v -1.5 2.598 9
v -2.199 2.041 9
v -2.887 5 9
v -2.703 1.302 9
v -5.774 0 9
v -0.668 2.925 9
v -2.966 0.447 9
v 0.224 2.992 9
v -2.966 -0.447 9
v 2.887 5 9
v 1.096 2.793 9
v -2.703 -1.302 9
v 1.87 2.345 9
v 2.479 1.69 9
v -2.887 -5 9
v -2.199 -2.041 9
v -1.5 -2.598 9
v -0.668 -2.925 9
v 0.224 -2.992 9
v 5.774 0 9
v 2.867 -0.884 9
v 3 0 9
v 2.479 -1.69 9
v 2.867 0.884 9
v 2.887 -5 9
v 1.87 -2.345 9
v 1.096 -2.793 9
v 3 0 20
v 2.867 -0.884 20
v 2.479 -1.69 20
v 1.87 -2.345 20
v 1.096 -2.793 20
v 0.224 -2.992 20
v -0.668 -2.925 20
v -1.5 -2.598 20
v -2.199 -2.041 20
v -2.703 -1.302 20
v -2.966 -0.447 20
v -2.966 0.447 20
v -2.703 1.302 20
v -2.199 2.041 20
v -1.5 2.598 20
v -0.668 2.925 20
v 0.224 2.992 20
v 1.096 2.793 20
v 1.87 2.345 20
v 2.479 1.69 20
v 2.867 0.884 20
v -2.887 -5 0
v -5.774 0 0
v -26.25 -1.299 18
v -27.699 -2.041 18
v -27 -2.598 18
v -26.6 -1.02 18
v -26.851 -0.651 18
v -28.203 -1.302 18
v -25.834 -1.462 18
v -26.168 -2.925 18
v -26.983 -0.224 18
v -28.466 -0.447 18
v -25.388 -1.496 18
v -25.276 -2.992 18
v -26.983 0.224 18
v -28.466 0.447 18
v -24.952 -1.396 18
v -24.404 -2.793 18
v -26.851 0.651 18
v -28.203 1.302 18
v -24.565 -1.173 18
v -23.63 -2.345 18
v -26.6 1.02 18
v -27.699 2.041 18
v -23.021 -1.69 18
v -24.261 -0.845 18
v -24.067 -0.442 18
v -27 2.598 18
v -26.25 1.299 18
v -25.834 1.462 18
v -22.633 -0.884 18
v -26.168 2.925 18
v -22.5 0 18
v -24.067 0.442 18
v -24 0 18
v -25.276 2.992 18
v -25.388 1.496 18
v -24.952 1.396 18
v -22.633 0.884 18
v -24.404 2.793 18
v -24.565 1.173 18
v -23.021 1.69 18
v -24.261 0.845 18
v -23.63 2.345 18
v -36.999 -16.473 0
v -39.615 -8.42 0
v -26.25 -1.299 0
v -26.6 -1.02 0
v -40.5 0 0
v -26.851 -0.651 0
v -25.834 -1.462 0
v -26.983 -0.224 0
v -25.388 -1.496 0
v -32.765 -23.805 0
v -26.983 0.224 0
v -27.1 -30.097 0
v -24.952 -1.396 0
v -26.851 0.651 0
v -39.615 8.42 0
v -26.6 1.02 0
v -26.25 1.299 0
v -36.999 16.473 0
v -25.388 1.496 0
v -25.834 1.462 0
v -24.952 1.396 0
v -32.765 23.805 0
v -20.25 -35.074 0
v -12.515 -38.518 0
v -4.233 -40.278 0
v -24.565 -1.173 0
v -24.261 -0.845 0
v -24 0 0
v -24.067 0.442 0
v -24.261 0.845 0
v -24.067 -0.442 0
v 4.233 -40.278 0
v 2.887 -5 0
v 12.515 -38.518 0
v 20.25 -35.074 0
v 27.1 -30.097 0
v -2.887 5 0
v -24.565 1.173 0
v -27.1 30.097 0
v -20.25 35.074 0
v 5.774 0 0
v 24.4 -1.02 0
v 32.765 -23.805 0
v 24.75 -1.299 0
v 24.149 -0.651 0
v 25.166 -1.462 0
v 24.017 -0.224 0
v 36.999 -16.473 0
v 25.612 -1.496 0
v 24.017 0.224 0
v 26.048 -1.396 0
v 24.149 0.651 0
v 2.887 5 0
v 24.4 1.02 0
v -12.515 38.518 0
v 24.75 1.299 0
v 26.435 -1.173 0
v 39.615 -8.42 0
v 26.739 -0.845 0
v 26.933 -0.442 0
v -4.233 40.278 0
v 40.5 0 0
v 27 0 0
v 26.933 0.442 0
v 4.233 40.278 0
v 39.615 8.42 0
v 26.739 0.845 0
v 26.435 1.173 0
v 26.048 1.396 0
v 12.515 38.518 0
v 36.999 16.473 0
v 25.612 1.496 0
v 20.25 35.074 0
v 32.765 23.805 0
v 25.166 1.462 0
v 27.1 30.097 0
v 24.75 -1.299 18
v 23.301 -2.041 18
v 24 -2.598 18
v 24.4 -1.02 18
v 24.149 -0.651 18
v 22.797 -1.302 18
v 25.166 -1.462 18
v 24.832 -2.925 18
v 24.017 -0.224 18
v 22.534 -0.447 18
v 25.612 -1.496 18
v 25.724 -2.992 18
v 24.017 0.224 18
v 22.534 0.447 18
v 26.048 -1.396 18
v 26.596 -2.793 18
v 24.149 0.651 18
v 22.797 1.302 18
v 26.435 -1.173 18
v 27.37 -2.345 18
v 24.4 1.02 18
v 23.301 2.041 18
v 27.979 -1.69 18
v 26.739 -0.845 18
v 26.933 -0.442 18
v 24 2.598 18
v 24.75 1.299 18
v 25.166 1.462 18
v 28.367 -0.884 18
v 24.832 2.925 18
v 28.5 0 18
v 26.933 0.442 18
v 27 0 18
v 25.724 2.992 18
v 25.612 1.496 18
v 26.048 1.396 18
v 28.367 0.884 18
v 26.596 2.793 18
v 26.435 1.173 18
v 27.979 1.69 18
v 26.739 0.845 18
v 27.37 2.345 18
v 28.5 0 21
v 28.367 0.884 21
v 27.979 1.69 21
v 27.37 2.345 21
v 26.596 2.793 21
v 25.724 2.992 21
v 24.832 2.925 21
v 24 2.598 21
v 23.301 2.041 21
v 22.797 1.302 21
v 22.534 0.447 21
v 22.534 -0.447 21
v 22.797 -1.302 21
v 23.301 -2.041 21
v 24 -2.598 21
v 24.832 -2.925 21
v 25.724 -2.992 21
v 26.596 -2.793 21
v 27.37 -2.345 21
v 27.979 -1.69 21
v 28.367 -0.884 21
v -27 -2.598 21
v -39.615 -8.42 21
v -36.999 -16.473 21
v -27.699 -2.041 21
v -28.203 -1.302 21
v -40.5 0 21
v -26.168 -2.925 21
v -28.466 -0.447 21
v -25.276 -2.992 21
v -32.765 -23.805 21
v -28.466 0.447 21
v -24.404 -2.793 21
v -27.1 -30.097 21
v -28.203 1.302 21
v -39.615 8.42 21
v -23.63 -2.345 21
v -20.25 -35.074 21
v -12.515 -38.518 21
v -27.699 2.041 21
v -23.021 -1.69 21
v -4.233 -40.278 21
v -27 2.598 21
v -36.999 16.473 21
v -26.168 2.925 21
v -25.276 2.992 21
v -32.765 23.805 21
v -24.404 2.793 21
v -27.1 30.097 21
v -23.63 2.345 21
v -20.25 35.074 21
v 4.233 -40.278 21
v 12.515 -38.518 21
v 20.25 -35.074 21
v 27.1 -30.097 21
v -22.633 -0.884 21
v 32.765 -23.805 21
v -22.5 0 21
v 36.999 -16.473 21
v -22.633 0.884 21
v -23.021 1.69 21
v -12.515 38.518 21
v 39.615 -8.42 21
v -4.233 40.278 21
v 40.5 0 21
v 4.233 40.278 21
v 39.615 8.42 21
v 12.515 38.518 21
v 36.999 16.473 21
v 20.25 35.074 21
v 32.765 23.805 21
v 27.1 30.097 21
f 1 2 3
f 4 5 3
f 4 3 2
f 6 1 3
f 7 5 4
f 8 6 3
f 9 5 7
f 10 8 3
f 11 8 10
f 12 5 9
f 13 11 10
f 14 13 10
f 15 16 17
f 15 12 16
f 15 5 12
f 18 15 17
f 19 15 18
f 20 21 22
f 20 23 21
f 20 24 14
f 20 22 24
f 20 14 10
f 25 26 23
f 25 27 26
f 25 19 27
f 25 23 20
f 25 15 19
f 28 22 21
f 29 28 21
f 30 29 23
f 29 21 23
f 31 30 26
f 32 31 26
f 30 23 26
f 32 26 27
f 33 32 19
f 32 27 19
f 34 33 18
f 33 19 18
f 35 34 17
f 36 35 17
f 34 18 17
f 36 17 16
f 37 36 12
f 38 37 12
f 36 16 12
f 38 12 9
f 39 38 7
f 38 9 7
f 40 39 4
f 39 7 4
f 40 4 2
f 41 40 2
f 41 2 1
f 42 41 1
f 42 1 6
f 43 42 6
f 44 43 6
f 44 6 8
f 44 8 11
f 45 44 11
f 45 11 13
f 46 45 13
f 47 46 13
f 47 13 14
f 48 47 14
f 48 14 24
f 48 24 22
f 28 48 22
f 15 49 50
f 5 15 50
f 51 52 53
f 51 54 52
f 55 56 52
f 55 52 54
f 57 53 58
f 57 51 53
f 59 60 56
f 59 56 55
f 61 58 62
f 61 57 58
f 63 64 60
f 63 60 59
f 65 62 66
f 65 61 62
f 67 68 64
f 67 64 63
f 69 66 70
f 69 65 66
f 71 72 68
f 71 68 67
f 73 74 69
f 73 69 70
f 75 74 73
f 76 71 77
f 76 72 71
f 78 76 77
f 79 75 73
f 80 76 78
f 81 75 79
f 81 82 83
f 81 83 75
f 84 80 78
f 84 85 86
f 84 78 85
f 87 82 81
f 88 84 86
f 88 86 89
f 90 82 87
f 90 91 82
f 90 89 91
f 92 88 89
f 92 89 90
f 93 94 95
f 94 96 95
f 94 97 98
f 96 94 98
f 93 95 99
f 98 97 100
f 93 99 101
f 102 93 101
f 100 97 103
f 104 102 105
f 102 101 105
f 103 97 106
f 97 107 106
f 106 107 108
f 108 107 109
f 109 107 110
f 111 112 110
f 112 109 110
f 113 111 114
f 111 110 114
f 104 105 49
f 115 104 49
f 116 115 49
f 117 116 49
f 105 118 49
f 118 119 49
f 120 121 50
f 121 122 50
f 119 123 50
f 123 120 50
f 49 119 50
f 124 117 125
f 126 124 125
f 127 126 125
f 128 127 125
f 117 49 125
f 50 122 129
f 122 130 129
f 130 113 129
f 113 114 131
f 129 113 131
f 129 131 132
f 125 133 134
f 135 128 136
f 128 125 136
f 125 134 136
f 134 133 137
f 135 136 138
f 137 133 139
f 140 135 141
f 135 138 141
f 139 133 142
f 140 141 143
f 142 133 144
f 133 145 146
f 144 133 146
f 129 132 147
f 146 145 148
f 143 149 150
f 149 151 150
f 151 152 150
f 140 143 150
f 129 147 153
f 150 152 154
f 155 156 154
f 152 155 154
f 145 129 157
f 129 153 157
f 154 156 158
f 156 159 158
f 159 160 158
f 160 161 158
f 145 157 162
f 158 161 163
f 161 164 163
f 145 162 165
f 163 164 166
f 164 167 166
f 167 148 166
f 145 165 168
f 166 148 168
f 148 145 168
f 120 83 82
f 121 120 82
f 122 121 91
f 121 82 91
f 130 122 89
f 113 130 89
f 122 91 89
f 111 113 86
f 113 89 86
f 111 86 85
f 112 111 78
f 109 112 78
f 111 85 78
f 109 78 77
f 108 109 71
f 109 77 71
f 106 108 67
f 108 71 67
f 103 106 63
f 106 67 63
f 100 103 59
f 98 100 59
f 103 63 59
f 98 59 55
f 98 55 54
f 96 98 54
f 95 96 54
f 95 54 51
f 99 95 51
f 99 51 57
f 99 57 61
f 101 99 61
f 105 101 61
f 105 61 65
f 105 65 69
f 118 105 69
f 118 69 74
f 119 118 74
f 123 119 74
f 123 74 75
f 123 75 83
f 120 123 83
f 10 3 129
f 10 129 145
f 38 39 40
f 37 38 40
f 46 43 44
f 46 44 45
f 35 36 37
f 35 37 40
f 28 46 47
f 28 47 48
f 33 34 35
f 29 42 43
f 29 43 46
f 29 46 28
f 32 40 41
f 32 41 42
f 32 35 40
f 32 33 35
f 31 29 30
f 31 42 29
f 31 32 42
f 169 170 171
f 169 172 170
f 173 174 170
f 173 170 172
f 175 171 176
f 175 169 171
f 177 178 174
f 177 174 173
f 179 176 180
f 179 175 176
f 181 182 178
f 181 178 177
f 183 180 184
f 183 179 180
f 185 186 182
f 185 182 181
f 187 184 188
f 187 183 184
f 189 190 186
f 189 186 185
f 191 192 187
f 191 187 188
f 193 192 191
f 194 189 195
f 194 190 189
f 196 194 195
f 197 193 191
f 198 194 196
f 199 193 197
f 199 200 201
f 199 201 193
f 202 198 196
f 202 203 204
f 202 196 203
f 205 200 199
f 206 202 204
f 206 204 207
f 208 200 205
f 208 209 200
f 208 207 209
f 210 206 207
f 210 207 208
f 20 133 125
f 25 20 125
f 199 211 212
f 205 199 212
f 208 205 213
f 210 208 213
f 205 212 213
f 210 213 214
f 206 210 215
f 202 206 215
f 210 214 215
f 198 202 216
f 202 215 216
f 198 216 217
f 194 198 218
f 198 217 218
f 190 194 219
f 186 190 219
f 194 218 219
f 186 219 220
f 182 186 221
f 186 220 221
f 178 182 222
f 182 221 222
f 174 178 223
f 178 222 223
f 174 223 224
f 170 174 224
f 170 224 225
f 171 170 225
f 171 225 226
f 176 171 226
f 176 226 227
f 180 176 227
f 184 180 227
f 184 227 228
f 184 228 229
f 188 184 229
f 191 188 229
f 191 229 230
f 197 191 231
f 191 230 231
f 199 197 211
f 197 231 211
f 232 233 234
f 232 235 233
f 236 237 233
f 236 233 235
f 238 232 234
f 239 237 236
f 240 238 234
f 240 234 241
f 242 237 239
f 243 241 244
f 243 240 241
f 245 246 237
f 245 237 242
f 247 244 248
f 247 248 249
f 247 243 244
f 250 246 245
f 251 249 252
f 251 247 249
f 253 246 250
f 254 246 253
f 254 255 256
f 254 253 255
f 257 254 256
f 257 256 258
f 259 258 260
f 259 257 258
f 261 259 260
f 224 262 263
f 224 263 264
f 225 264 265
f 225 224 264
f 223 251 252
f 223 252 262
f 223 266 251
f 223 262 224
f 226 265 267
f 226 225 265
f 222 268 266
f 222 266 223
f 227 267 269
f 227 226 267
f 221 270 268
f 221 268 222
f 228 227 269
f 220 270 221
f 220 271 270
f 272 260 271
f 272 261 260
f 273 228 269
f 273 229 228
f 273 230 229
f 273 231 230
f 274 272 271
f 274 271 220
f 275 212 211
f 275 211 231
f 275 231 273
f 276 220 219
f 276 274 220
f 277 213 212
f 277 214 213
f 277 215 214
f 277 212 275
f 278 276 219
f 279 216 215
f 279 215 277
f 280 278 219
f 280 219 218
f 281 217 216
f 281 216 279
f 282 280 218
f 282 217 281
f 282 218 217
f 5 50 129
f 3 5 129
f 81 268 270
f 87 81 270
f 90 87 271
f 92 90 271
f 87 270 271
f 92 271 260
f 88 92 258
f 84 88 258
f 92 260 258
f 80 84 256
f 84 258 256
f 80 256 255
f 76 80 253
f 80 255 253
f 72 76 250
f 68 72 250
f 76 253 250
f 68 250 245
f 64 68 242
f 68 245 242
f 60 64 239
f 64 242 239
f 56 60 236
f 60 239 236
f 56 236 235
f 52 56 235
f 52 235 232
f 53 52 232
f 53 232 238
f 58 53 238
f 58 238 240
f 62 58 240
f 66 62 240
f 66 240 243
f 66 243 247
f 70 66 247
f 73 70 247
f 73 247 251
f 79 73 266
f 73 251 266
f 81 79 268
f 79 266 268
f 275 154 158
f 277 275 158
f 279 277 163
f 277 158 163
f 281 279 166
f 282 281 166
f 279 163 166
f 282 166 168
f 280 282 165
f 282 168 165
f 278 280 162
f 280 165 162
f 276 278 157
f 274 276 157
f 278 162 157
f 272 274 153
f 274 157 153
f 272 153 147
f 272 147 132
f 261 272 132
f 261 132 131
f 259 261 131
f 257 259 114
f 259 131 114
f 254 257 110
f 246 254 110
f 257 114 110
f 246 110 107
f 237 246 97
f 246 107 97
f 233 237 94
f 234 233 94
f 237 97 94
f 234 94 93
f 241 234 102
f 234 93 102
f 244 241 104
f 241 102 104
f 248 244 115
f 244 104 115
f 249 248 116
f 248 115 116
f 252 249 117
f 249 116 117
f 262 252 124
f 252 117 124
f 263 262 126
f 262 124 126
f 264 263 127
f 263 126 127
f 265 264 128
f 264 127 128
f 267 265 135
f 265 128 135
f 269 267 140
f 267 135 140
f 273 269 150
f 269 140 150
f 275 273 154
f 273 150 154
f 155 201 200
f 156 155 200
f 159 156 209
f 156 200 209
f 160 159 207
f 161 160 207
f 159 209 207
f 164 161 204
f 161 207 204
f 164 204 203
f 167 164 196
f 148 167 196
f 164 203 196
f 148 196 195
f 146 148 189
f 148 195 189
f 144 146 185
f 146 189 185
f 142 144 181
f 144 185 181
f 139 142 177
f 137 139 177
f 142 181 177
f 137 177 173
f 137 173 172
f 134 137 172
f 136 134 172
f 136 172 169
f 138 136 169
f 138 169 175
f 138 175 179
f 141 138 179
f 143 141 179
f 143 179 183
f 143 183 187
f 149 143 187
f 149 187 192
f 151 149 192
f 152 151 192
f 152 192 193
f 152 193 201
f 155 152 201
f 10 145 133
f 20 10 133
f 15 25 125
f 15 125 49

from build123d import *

# Parameters (mm, degrees)
F0_R     = 40.5
F1_DEPTH = 21
F2_R     = 3
F3_DEPTH = 3
F4_R     = 1.5
F5_DEPTH = 25
F7_DEPTH = 9
F8_R     = 3
F9_DEPTH = 20


with BuildPart() as f1:
    # F0 (on Top) → F1 (new body)
    with BuildSketch(Plane.XY):
        Circle(F0_R)
    extrude(amount=F1_DEPTH)

    # F2 (on face) → F3 (cut)
    with BuildSketch(Plane.XY.offset(21)):
        with Locations((-25.5, 0)):
            Circle(F2_R)
        with Locations((25.5, 0)):
            Circle(F2_R)
    extrude(amount=-F3_DEPTH, mode=Mode.SUBTRACT)

    # F4 (on face) → F5 (cut)
    with BuildSketch(Plane.XY.offset(18)):
        with Locations((-25.5, 0)):
            Circle(F4_R)
        with Locations((25.5, 0)):
            Circle(F4_R)
    extrude(amount=-F5_DEPTH, mode=Mode.SUBTRACT)

    # F6 (on face) → F7 (cut)
    with BuildSketch(Plane(origin=(0, 0, 0), x_dir=(1, 0, 0), z_dir=(0, 0, -1))):
        Polygon((2.886751, 5), (-2.886751, 5), (-5.773503, 0), (-2.886751, -5), (2.886751, -5), (5.773503, 0), align=None)
    extrude(amount=-F7_DEPTH, mode=Mode.SUBTRACT)

    # F8 (on face) → F9 (cut)
    with BuildSketch(Plane(origin=(0, 0, 0), x_dir=(1, 0, 0), z_dir=(0, 0, -1))):
        Circle(F8_R)
    extrude(amount=-F9_DEPTH, mode=Mode.SUBTRACT)


solid = f1.part
